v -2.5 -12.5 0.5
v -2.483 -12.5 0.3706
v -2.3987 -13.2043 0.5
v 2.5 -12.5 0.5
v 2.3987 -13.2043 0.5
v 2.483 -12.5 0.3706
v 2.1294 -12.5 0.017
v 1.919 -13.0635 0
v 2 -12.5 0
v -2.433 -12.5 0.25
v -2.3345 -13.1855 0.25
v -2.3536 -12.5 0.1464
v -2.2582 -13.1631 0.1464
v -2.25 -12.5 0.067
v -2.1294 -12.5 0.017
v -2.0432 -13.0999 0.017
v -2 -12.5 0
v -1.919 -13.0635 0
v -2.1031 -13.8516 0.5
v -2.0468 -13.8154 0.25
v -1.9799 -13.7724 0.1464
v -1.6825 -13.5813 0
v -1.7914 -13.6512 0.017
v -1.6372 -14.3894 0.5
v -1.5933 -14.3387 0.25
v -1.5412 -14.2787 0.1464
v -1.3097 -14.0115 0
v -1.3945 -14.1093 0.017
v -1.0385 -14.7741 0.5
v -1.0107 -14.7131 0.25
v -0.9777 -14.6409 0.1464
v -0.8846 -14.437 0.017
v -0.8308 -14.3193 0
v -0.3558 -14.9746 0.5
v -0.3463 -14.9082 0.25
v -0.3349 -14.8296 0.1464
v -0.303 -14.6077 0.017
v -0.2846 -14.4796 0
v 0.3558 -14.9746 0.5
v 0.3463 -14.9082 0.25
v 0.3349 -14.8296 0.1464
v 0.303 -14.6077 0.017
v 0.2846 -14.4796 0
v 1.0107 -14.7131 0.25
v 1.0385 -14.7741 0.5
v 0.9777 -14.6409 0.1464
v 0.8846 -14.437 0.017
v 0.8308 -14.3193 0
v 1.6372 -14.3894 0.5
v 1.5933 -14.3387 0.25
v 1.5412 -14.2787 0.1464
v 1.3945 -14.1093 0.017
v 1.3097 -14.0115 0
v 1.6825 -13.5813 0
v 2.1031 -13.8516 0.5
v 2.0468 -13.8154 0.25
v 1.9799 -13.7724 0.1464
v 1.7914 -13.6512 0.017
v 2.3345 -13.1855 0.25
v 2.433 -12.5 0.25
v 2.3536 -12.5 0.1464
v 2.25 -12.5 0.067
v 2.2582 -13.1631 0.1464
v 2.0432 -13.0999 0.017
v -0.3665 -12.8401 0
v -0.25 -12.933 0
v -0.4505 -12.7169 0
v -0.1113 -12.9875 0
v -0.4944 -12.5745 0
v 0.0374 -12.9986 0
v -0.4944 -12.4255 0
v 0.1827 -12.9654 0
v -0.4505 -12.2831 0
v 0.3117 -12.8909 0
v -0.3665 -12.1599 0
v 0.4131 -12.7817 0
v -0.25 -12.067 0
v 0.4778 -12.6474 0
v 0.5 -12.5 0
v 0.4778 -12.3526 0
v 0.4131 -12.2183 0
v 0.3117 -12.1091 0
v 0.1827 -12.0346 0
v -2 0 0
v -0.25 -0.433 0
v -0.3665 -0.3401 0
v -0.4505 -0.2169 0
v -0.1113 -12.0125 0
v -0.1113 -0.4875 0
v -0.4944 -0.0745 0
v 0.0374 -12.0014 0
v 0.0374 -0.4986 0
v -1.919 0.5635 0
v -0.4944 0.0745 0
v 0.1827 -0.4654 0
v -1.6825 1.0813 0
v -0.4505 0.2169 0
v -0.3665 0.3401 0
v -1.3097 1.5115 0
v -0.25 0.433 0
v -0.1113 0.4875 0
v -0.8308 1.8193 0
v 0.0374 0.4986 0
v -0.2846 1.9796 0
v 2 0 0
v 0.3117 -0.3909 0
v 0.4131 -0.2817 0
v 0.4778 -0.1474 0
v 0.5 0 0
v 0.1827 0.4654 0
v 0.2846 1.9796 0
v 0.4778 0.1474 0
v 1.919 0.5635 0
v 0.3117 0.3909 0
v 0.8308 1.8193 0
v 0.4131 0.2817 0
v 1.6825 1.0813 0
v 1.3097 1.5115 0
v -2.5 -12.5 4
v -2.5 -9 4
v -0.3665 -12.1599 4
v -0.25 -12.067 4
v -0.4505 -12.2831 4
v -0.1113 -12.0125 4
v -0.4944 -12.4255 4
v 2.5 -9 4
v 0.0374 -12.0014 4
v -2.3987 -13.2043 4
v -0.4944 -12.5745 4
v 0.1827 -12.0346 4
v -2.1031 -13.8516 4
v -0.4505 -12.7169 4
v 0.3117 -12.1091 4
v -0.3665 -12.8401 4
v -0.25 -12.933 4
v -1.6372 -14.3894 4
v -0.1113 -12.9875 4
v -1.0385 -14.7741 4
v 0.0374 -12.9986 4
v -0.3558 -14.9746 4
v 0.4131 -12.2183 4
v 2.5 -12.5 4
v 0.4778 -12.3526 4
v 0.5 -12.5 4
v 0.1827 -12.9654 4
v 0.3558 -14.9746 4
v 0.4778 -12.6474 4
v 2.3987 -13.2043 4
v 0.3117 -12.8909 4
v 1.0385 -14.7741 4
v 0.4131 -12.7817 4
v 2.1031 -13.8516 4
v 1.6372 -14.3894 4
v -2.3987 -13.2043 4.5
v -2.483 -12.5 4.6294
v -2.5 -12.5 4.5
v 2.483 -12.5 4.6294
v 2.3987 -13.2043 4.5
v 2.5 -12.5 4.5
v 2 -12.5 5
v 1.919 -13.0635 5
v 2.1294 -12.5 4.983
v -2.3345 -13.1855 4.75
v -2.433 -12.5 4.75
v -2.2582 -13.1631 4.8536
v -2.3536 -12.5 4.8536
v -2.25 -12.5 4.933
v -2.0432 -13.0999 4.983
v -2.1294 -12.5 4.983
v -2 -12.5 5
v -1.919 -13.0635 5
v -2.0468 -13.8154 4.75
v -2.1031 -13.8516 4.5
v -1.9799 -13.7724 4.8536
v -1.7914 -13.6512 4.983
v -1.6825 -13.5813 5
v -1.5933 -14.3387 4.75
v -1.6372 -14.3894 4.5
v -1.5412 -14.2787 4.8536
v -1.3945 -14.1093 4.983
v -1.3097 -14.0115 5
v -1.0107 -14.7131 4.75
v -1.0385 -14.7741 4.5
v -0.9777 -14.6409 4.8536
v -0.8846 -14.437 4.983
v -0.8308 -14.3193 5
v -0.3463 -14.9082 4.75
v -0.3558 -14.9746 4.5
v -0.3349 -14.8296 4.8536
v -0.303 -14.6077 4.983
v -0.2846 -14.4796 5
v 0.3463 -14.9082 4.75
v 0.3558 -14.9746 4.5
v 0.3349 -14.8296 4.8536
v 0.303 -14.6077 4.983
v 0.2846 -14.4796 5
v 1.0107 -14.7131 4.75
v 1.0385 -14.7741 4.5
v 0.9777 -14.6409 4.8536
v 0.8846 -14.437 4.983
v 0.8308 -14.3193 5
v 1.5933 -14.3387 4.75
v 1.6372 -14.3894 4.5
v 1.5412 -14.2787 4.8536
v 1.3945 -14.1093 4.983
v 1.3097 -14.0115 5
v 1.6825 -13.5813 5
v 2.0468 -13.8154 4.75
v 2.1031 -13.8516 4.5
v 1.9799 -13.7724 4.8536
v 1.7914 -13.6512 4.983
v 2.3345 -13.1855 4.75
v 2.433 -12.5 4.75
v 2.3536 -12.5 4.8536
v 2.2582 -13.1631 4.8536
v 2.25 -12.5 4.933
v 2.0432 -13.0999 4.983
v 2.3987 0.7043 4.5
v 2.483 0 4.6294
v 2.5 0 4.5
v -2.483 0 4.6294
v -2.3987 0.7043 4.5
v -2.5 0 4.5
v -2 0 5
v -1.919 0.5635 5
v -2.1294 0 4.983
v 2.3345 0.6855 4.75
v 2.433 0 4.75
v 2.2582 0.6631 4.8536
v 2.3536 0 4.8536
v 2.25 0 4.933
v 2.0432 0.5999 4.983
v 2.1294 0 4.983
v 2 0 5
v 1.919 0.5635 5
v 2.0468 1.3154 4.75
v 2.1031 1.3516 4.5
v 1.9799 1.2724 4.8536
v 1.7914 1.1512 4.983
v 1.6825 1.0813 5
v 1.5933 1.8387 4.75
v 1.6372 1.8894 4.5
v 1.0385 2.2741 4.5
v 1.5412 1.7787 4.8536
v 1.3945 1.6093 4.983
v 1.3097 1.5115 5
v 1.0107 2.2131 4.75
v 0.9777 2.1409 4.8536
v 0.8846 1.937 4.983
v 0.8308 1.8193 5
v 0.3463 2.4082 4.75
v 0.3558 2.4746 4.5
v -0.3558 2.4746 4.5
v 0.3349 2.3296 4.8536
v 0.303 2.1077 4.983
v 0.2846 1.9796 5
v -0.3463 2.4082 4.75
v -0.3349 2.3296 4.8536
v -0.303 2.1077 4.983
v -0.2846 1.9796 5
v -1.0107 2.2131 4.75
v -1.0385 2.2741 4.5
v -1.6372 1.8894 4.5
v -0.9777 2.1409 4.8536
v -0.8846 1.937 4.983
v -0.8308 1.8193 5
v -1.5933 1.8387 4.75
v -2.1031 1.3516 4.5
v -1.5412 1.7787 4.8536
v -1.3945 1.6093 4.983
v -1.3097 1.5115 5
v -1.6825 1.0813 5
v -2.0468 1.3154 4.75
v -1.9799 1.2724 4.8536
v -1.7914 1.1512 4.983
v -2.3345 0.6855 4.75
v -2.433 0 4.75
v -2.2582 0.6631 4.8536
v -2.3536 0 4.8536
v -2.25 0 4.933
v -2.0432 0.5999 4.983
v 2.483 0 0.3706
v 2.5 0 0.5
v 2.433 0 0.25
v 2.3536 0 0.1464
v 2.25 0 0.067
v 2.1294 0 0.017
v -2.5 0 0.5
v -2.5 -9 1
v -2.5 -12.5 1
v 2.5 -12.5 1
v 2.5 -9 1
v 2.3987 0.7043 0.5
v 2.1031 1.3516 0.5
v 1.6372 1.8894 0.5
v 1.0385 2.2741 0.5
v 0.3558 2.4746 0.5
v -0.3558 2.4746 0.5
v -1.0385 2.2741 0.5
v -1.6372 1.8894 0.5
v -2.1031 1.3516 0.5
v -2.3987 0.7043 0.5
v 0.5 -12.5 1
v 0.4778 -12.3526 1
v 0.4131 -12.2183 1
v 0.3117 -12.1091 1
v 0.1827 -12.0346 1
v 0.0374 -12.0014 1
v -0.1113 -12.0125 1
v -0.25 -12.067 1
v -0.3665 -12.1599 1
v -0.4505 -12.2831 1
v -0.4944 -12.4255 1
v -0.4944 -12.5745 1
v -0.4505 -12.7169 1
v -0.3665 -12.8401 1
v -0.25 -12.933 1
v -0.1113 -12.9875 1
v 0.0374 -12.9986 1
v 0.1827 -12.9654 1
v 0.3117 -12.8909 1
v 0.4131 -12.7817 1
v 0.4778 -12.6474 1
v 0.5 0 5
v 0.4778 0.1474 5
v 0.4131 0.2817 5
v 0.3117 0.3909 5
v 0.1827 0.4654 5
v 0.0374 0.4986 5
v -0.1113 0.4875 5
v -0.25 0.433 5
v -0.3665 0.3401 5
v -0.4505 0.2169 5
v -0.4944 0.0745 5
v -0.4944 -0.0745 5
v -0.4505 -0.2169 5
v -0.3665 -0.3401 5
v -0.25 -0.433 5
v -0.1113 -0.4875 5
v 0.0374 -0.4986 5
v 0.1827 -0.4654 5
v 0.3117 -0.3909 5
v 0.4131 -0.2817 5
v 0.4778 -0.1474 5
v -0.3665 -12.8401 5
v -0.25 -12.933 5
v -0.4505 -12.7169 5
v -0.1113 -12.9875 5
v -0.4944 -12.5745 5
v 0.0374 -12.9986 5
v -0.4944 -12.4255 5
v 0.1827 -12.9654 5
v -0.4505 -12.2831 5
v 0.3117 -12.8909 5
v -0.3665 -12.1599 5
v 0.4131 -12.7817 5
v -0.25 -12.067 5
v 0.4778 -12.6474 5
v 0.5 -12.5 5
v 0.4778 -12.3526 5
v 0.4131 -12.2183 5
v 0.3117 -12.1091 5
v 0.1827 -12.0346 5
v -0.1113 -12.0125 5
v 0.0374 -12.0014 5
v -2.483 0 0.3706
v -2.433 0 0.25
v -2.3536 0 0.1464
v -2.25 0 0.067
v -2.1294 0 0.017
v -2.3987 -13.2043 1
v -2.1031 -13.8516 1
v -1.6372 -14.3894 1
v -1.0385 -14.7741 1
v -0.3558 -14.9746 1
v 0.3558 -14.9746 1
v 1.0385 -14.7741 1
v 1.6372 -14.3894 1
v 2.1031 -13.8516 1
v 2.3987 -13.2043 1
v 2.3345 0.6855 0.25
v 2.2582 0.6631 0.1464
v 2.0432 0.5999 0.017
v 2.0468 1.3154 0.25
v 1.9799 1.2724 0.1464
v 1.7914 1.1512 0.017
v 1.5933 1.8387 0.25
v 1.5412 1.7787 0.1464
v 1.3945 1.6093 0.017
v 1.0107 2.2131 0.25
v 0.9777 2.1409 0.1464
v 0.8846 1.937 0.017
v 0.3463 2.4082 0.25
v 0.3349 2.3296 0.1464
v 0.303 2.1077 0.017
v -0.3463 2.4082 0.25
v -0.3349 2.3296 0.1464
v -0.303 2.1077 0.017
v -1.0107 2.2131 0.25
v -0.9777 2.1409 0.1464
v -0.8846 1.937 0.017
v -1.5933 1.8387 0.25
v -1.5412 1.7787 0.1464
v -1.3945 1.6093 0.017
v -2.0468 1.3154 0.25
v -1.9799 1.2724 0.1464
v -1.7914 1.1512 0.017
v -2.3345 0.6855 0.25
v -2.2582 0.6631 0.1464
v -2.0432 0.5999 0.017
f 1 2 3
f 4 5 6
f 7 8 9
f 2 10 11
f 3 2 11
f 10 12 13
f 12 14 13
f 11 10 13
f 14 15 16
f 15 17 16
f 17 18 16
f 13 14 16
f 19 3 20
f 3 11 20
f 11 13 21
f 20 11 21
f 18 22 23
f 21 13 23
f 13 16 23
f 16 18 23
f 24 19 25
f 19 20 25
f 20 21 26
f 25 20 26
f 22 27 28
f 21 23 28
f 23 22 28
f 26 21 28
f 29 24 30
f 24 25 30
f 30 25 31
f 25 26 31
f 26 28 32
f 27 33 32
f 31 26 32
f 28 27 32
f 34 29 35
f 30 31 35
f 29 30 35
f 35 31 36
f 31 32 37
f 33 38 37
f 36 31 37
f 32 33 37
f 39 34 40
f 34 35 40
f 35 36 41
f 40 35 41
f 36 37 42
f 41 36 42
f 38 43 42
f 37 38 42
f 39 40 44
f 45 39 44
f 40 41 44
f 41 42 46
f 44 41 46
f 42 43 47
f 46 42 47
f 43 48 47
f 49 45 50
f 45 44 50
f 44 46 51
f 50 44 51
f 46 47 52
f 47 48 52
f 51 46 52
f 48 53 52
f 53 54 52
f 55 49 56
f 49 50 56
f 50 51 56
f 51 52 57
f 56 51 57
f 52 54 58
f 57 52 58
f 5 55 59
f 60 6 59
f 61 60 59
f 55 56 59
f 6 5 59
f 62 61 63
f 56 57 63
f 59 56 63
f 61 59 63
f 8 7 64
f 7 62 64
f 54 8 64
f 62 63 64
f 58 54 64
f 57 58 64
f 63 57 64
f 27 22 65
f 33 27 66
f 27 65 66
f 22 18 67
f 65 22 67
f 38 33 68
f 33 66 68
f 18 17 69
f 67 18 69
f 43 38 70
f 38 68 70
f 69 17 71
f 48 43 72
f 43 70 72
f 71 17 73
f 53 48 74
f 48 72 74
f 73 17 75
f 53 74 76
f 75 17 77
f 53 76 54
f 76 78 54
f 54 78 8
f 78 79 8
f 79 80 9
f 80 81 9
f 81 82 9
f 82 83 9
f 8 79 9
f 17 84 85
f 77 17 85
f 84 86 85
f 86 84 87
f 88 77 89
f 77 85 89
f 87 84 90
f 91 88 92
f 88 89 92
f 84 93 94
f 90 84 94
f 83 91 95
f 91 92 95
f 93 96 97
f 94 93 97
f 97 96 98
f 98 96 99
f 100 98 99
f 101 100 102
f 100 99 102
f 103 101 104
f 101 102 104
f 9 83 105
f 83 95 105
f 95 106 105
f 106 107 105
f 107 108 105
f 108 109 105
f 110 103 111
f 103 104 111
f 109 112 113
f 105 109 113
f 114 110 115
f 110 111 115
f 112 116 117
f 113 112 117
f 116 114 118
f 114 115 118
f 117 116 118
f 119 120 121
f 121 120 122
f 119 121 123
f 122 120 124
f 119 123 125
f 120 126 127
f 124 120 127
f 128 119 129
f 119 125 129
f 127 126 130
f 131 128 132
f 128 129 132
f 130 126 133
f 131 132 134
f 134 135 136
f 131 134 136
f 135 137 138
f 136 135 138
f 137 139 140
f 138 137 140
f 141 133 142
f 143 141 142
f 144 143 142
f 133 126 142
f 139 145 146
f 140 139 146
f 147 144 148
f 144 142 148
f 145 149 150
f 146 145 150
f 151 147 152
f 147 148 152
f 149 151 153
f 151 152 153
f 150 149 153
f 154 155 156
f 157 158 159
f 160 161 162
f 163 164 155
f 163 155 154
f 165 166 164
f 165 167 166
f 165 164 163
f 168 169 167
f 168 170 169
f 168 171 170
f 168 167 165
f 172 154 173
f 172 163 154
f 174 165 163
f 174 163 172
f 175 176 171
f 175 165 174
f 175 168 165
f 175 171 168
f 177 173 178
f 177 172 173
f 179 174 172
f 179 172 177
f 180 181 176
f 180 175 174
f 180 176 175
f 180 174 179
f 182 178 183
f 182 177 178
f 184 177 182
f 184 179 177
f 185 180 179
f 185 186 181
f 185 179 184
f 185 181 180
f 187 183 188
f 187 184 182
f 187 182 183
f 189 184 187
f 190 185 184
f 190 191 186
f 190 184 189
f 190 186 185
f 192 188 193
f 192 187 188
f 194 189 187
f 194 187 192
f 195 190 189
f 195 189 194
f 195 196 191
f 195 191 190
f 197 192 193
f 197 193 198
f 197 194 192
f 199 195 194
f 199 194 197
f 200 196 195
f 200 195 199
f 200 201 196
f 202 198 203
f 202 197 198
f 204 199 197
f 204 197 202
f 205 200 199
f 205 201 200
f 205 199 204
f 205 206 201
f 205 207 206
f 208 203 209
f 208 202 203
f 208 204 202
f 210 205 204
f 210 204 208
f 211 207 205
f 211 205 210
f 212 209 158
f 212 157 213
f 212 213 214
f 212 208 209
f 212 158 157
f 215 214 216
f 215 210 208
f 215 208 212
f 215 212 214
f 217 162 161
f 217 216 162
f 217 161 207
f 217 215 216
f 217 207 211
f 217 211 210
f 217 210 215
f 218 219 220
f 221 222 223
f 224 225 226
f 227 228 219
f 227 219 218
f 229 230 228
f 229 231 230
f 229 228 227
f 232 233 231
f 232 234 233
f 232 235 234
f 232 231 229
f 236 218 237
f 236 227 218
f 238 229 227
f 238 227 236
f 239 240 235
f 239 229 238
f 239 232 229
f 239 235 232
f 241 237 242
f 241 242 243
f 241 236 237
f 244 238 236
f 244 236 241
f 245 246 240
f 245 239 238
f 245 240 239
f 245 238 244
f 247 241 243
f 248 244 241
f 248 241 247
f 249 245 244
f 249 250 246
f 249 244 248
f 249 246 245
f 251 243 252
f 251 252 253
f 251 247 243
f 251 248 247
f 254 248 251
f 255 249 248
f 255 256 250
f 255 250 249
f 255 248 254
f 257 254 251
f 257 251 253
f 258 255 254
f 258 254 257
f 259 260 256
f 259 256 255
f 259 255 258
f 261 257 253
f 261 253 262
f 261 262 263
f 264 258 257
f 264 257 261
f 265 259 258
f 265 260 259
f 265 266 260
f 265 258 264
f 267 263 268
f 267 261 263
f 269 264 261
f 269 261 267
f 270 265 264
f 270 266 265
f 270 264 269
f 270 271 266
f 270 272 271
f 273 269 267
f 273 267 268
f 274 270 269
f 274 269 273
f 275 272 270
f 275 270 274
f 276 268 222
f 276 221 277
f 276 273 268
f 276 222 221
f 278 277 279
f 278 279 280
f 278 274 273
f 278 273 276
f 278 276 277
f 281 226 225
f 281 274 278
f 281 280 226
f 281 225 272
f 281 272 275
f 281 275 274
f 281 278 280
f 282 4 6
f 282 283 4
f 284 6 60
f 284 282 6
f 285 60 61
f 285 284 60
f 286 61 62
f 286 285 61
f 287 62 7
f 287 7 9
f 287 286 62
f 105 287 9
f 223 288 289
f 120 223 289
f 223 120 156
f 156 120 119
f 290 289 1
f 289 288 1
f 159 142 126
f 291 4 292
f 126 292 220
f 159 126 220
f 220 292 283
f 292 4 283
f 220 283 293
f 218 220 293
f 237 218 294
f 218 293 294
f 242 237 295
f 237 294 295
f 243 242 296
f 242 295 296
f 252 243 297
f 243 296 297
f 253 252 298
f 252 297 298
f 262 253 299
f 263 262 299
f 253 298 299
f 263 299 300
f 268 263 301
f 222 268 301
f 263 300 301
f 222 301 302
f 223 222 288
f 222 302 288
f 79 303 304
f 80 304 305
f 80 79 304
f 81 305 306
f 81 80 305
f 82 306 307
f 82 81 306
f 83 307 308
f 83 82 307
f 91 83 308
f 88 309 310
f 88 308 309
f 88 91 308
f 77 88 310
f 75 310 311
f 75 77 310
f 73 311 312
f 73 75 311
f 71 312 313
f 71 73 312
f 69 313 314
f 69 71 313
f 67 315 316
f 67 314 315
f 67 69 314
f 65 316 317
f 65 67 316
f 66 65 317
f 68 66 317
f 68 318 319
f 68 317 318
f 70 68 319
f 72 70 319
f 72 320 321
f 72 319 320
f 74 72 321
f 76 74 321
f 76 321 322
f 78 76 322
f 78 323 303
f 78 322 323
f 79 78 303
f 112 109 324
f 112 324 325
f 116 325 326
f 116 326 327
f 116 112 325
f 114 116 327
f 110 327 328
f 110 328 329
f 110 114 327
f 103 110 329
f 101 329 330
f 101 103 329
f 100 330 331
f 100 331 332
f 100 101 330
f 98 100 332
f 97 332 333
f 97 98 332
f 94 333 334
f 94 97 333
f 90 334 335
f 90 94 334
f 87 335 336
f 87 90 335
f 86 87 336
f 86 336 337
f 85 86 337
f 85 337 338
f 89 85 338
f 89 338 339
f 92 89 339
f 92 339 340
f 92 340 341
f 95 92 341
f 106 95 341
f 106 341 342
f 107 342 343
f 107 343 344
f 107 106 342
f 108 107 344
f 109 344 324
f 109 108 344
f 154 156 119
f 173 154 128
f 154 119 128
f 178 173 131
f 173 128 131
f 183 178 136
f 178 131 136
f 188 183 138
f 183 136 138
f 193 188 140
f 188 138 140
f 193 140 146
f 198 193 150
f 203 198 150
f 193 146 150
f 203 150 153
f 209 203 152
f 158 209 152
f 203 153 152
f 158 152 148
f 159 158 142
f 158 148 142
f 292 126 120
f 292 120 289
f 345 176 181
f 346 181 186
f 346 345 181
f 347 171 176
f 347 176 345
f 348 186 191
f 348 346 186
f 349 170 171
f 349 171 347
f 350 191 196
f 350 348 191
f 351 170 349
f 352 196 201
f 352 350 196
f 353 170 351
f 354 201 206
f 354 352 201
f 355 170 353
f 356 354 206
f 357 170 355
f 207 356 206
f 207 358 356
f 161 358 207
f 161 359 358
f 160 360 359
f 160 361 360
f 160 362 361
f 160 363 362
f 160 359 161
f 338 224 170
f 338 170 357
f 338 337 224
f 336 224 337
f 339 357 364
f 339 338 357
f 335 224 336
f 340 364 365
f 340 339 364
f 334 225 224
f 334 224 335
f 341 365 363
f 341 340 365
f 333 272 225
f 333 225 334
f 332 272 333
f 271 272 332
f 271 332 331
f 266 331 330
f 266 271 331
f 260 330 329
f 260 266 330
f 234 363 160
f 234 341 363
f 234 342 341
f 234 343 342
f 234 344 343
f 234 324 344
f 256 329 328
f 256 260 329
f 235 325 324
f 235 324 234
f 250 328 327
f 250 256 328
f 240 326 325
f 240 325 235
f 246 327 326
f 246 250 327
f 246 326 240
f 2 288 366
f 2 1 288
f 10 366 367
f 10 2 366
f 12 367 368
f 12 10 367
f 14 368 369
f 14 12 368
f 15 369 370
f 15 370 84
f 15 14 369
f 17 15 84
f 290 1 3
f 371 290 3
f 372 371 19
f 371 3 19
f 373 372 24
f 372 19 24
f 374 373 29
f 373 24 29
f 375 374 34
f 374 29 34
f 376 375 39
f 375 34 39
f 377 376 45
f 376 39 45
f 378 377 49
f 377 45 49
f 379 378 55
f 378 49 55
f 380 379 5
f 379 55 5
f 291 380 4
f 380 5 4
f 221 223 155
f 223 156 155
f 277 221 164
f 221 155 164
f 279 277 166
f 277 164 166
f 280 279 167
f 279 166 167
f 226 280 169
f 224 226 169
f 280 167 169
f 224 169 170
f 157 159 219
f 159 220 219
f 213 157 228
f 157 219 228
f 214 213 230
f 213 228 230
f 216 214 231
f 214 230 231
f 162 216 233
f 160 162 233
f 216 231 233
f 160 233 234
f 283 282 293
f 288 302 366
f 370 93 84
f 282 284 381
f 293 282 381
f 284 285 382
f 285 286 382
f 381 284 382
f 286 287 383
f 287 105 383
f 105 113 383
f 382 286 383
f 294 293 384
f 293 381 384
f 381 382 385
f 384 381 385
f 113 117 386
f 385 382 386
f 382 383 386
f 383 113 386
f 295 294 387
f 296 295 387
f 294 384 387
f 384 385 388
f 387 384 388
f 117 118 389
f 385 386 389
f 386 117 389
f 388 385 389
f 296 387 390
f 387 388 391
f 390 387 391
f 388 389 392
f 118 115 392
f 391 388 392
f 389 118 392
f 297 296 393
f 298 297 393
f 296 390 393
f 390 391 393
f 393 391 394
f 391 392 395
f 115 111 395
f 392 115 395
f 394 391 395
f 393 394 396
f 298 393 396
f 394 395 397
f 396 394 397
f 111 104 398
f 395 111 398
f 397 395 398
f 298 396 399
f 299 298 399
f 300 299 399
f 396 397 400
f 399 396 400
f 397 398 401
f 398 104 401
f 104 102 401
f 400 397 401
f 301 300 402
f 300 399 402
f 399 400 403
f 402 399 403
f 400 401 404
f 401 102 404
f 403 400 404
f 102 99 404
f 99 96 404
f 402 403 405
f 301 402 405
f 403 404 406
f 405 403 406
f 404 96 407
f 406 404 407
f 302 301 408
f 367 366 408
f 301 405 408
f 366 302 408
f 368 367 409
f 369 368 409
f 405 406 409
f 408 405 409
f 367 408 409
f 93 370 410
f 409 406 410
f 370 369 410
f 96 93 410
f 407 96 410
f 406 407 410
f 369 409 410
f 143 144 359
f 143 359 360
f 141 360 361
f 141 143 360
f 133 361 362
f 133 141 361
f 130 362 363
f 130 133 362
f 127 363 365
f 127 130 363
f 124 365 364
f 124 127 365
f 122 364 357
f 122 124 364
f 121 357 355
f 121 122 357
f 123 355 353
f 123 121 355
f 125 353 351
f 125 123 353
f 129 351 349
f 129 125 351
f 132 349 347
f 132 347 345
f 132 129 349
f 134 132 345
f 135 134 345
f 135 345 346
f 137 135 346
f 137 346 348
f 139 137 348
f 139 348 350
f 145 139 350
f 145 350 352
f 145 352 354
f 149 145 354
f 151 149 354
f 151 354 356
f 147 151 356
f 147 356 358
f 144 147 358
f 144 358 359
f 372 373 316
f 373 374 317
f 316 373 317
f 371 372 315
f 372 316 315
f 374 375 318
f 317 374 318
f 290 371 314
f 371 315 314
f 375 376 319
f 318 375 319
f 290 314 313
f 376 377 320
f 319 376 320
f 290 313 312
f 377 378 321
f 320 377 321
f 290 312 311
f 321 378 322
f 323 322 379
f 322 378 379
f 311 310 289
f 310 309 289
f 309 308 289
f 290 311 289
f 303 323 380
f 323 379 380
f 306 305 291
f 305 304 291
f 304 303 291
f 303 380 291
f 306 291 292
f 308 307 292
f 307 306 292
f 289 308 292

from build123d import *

# Parameters (mm, degrees)
CROQUIS1_R              = 0.5
SALIENTE_EXTRUIR2_DEPTH = 5
CROQUIS3_W              = 3
CROQUIS3_H              = 3.5
CROQUIS3_H_2            = 3.121183209
CORTAR_EXTRUIR2_DEPTH   = 5
REDONDEO1_R             = 0.5
REDONDEO2_R             = 0.5


with BuildPart() as part:
    # Croquis1 → Saliente-Extruir2 (new body)
    with BuildSketch(Plane.XY):
        with BuildLine():
            Line((-2.5, 0), (-2.5, -12.5))
            ThreePointArc((-2.5, -12.5), (0, -15), (2.5, -12.5))
            Line((2.5, -12.5), (2.5, 0))
            ThreePointArc((2.5, 0), (0, 2.5), (-2.5, 0))
        make_face()
        Circle(CROQUIS1_R, mode=Mode.SUBTRACT)
        with Locations((0, -12.5)):
            Circle(CROQUIS1_R, mode=Mode.SUBTRACT)
    extrude(amount=SALIENTE_EXTRUIR2_DEPTH)

    # Croquis3 → Cortar-Extruir2 (cut)
    with BuildSketch(Plane(origin=(2.5, 0, 0), x_dir=(0, 0, -1), z_dir=(1, 0, 0))):
        with Locations((-2.5, -10.75)):
            Rectangle(CROQUIS3_W, CROQUIS3_H)
        with Locations((-2.5, -14.060591605)):
            Rectangle(CROQUIS3_W, CROQUIS3_H_2)
    extrude(amount=-CORTAR_EXTRUIR2_DEPTH, mode=Mode.SUBTRACT)

    # Redondeo1
    redondeo1_edges = [part.edges().sort_by_distance(p)[0] for p in [
        (-2.5, -6.25, 5),
        (0, -15, 5),
        (2.5, -6.25, 5),
        (0, 2.5, 5),
    ]]
    fillet(redondeo1_edges, radius=REDONDEO1_R)

    # Redondeo2
    redondeo2_edges = [part.edges().sort_by_distance(p)[0] for p in [
        (-2.5, -6.25, 0),
        (0, 2.5, 0),
        (2.5, -6.25, 0),
        (0, -15, 0),
    ]]
    fillet(redondeo2_edges, radius=REDONDEO2_R)


solid = part.part
